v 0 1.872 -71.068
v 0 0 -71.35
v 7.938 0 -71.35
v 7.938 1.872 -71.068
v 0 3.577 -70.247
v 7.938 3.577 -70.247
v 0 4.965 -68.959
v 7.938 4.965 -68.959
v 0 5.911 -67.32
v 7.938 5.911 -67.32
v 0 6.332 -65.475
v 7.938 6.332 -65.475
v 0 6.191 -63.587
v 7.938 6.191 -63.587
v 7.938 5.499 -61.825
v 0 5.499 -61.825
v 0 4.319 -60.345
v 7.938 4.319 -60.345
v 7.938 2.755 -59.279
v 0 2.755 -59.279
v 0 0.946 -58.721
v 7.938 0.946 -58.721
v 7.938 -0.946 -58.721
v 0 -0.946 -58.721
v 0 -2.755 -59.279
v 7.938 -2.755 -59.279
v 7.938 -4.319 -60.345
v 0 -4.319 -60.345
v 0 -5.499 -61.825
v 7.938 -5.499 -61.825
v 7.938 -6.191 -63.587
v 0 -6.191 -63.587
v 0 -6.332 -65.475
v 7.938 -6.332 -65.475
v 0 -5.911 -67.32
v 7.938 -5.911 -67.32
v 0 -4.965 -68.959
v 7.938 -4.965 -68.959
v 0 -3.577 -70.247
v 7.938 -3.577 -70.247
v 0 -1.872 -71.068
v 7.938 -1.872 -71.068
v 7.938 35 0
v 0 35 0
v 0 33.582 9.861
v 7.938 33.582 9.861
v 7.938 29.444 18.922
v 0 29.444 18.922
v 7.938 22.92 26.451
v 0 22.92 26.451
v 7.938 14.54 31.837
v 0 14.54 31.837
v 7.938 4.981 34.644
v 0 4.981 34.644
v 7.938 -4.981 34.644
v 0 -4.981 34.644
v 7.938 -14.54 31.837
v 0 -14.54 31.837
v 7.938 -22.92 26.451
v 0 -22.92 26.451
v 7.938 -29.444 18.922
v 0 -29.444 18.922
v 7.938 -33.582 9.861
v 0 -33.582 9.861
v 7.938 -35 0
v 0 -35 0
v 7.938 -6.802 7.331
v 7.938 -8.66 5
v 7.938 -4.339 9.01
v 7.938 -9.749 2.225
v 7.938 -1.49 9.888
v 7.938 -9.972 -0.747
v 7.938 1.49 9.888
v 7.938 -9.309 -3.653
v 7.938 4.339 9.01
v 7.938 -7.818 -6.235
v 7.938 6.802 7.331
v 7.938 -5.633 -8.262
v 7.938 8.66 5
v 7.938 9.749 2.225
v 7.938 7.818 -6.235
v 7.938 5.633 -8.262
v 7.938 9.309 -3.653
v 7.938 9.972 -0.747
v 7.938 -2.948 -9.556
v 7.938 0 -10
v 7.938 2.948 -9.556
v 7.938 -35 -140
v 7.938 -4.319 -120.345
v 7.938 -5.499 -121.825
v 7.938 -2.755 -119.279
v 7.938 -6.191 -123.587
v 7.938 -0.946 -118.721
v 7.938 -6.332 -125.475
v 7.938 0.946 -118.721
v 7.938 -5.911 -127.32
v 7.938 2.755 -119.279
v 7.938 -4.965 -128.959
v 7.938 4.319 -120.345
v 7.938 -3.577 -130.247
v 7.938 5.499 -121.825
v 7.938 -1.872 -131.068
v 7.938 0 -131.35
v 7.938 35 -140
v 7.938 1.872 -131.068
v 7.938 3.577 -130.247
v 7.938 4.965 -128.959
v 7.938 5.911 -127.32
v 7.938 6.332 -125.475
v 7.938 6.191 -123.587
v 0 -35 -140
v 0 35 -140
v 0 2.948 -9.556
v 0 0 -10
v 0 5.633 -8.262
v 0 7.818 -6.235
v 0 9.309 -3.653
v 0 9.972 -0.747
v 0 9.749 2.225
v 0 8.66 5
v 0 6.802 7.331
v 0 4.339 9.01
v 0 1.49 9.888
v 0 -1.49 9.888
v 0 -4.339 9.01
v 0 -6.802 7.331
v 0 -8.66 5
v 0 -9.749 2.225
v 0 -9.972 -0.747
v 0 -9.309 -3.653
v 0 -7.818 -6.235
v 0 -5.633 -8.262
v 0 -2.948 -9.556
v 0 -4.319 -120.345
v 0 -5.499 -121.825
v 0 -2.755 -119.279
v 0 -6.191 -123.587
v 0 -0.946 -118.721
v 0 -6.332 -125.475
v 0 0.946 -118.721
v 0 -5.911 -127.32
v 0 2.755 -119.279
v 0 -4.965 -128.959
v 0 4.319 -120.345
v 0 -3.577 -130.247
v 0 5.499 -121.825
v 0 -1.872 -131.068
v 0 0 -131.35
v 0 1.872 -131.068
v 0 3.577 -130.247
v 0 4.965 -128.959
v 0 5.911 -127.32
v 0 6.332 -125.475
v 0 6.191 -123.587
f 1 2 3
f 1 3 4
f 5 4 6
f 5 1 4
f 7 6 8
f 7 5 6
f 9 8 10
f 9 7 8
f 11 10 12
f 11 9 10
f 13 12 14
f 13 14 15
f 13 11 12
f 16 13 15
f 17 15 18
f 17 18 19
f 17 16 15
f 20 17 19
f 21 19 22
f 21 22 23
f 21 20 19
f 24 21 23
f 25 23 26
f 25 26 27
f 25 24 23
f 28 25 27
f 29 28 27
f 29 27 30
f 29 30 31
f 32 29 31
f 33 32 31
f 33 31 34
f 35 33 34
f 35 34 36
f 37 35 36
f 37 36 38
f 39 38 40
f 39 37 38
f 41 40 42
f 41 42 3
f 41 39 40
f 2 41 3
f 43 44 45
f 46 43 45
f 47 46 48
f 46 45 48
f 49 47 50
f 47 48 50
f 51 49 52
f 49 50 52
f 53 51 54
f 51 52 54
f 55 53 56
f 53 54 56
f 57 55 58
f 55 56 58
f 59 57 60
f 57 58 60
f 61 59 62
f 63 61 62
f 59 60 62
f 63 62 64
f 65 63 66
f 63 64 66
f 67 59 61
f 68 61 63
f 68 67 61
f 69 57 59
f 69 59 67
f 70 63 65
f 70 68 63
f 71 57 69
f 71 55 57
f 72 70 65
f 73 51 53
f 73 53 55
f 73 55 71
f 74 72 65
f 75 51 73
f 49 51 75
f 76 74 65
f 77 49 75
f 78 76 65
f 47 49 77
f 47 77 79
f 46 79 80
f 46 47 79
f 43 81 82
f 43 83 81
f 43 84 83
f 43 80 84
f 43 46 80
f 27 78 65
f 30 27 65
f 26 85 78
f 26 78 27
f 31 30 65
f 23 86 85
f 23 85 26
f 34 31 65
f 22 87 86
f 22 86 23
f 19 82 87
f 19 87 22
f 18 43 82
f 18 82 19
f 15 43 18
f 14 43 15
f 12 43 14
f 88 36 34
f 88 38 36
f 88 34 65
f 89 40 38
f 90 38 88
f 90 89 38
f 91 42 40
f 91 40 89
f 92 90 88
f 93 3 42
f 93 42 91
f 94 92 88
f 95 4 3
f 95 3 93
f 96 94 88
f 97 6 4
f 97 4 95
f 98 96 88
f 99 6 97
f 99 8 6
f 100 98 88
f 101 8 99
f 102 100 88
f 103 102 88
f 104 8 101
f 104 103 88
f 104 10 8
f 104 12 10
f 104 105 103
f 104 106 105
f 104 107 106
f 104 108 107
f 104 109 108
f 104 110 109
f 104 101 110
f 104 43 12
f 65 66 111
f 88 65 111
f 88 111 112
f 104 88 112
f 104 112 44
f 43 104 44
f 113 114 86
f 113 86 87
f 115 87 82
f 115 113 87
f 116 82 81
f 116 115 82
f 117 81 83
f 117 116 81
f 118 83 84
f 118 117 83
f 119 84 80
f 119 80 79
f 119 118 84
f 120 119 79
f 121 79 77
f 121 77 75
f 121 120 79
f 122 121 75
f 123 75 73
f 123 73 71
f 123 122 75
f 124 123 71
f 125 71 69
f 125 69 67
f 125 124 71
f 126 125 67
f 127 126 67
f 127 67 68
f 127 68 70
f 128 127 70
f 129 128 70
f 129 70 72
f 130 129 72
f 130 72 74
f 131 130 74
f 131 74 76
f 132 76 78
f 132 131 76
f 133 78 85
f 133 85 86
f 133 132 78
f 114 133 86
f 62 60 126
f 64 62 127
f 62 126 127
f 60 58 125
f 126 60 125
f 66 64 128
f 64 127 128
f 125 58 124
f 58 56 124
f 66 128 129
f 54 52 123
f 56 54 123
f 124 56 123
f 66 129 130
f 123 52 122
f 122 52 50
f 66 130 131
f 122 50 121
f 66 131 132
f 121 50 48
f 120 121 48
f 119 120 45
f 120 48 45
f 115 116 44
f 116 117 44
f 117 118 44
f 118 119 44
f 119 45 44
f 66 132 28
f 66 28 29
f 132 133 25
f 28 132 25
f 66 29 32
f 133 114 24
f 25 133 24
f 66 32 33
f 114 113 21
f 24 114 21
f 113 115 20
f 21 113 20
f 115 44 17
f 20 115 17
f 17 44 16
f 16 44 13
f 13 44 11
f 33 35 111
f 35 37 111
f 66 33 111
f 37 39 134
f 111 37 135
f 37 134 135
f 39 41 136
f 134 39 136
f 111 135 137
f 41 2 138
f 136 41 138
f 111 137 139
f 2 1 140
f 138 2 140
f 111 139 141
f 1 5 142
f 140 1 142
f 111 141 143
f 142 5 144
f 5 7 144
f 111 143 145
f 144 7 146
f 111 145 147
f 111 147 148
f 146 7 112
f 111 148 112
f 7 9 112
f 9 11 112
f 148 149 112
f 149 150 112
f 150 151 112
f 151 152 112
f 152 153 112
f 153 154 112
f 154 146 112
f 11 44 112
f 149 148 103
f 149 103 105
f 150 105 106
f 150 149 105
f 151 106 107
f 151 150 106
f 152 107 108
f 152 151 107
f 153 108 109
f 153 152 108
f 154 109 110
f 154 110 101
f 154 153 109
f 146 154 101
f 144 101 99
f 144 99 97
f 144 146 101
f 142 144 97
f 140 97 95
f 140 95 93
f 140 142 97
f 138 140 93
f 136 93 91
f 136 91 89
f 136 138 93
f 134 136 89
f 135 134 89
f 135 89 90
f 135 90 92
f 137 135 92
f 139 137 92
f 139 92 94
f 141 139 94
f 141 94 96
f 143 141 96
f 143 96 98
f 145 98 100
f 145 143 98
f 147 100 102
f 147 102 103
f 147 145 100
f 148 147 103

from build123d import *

# Parameters (mm, degrees)
CROQUIS1_R              = 10
CROQUIS1_R_2            = 6.35
SALIENTE_EXTRUIR1_DEPTH = 7.9375


with BuildPart() as part:
    # Croquis1 → Saliente-Extruir1 (new body)
    with BuildSketch(Plane(origin=(0, 0, 0), x_dir=(0, 0, -1), z_dir=(1, 0, 0))):
        with BuildLine():
            Line((0, -35), (140, -35))
            Line((140, -35), (140, 35))
            Line((140, 35), (0, 35))
            ThreePointArc((0, 35), (-35, 0), (0, -35))
        make_face()
        Circle(CROQUIS1_R, mode=Mode.SUBTRACT)
        with Locations((65, 0)):
            Circle(CROQUIS1_R_2, mode=Mode.SUBTRACT)
        with Locations((125, 0)):
            Circle(CROQUIS1_R_2, mode=Mode.SUBTRACT)
    extrude(amount=SALIENTE_EXTRUIR1_DEPTH)


solid = part.part
